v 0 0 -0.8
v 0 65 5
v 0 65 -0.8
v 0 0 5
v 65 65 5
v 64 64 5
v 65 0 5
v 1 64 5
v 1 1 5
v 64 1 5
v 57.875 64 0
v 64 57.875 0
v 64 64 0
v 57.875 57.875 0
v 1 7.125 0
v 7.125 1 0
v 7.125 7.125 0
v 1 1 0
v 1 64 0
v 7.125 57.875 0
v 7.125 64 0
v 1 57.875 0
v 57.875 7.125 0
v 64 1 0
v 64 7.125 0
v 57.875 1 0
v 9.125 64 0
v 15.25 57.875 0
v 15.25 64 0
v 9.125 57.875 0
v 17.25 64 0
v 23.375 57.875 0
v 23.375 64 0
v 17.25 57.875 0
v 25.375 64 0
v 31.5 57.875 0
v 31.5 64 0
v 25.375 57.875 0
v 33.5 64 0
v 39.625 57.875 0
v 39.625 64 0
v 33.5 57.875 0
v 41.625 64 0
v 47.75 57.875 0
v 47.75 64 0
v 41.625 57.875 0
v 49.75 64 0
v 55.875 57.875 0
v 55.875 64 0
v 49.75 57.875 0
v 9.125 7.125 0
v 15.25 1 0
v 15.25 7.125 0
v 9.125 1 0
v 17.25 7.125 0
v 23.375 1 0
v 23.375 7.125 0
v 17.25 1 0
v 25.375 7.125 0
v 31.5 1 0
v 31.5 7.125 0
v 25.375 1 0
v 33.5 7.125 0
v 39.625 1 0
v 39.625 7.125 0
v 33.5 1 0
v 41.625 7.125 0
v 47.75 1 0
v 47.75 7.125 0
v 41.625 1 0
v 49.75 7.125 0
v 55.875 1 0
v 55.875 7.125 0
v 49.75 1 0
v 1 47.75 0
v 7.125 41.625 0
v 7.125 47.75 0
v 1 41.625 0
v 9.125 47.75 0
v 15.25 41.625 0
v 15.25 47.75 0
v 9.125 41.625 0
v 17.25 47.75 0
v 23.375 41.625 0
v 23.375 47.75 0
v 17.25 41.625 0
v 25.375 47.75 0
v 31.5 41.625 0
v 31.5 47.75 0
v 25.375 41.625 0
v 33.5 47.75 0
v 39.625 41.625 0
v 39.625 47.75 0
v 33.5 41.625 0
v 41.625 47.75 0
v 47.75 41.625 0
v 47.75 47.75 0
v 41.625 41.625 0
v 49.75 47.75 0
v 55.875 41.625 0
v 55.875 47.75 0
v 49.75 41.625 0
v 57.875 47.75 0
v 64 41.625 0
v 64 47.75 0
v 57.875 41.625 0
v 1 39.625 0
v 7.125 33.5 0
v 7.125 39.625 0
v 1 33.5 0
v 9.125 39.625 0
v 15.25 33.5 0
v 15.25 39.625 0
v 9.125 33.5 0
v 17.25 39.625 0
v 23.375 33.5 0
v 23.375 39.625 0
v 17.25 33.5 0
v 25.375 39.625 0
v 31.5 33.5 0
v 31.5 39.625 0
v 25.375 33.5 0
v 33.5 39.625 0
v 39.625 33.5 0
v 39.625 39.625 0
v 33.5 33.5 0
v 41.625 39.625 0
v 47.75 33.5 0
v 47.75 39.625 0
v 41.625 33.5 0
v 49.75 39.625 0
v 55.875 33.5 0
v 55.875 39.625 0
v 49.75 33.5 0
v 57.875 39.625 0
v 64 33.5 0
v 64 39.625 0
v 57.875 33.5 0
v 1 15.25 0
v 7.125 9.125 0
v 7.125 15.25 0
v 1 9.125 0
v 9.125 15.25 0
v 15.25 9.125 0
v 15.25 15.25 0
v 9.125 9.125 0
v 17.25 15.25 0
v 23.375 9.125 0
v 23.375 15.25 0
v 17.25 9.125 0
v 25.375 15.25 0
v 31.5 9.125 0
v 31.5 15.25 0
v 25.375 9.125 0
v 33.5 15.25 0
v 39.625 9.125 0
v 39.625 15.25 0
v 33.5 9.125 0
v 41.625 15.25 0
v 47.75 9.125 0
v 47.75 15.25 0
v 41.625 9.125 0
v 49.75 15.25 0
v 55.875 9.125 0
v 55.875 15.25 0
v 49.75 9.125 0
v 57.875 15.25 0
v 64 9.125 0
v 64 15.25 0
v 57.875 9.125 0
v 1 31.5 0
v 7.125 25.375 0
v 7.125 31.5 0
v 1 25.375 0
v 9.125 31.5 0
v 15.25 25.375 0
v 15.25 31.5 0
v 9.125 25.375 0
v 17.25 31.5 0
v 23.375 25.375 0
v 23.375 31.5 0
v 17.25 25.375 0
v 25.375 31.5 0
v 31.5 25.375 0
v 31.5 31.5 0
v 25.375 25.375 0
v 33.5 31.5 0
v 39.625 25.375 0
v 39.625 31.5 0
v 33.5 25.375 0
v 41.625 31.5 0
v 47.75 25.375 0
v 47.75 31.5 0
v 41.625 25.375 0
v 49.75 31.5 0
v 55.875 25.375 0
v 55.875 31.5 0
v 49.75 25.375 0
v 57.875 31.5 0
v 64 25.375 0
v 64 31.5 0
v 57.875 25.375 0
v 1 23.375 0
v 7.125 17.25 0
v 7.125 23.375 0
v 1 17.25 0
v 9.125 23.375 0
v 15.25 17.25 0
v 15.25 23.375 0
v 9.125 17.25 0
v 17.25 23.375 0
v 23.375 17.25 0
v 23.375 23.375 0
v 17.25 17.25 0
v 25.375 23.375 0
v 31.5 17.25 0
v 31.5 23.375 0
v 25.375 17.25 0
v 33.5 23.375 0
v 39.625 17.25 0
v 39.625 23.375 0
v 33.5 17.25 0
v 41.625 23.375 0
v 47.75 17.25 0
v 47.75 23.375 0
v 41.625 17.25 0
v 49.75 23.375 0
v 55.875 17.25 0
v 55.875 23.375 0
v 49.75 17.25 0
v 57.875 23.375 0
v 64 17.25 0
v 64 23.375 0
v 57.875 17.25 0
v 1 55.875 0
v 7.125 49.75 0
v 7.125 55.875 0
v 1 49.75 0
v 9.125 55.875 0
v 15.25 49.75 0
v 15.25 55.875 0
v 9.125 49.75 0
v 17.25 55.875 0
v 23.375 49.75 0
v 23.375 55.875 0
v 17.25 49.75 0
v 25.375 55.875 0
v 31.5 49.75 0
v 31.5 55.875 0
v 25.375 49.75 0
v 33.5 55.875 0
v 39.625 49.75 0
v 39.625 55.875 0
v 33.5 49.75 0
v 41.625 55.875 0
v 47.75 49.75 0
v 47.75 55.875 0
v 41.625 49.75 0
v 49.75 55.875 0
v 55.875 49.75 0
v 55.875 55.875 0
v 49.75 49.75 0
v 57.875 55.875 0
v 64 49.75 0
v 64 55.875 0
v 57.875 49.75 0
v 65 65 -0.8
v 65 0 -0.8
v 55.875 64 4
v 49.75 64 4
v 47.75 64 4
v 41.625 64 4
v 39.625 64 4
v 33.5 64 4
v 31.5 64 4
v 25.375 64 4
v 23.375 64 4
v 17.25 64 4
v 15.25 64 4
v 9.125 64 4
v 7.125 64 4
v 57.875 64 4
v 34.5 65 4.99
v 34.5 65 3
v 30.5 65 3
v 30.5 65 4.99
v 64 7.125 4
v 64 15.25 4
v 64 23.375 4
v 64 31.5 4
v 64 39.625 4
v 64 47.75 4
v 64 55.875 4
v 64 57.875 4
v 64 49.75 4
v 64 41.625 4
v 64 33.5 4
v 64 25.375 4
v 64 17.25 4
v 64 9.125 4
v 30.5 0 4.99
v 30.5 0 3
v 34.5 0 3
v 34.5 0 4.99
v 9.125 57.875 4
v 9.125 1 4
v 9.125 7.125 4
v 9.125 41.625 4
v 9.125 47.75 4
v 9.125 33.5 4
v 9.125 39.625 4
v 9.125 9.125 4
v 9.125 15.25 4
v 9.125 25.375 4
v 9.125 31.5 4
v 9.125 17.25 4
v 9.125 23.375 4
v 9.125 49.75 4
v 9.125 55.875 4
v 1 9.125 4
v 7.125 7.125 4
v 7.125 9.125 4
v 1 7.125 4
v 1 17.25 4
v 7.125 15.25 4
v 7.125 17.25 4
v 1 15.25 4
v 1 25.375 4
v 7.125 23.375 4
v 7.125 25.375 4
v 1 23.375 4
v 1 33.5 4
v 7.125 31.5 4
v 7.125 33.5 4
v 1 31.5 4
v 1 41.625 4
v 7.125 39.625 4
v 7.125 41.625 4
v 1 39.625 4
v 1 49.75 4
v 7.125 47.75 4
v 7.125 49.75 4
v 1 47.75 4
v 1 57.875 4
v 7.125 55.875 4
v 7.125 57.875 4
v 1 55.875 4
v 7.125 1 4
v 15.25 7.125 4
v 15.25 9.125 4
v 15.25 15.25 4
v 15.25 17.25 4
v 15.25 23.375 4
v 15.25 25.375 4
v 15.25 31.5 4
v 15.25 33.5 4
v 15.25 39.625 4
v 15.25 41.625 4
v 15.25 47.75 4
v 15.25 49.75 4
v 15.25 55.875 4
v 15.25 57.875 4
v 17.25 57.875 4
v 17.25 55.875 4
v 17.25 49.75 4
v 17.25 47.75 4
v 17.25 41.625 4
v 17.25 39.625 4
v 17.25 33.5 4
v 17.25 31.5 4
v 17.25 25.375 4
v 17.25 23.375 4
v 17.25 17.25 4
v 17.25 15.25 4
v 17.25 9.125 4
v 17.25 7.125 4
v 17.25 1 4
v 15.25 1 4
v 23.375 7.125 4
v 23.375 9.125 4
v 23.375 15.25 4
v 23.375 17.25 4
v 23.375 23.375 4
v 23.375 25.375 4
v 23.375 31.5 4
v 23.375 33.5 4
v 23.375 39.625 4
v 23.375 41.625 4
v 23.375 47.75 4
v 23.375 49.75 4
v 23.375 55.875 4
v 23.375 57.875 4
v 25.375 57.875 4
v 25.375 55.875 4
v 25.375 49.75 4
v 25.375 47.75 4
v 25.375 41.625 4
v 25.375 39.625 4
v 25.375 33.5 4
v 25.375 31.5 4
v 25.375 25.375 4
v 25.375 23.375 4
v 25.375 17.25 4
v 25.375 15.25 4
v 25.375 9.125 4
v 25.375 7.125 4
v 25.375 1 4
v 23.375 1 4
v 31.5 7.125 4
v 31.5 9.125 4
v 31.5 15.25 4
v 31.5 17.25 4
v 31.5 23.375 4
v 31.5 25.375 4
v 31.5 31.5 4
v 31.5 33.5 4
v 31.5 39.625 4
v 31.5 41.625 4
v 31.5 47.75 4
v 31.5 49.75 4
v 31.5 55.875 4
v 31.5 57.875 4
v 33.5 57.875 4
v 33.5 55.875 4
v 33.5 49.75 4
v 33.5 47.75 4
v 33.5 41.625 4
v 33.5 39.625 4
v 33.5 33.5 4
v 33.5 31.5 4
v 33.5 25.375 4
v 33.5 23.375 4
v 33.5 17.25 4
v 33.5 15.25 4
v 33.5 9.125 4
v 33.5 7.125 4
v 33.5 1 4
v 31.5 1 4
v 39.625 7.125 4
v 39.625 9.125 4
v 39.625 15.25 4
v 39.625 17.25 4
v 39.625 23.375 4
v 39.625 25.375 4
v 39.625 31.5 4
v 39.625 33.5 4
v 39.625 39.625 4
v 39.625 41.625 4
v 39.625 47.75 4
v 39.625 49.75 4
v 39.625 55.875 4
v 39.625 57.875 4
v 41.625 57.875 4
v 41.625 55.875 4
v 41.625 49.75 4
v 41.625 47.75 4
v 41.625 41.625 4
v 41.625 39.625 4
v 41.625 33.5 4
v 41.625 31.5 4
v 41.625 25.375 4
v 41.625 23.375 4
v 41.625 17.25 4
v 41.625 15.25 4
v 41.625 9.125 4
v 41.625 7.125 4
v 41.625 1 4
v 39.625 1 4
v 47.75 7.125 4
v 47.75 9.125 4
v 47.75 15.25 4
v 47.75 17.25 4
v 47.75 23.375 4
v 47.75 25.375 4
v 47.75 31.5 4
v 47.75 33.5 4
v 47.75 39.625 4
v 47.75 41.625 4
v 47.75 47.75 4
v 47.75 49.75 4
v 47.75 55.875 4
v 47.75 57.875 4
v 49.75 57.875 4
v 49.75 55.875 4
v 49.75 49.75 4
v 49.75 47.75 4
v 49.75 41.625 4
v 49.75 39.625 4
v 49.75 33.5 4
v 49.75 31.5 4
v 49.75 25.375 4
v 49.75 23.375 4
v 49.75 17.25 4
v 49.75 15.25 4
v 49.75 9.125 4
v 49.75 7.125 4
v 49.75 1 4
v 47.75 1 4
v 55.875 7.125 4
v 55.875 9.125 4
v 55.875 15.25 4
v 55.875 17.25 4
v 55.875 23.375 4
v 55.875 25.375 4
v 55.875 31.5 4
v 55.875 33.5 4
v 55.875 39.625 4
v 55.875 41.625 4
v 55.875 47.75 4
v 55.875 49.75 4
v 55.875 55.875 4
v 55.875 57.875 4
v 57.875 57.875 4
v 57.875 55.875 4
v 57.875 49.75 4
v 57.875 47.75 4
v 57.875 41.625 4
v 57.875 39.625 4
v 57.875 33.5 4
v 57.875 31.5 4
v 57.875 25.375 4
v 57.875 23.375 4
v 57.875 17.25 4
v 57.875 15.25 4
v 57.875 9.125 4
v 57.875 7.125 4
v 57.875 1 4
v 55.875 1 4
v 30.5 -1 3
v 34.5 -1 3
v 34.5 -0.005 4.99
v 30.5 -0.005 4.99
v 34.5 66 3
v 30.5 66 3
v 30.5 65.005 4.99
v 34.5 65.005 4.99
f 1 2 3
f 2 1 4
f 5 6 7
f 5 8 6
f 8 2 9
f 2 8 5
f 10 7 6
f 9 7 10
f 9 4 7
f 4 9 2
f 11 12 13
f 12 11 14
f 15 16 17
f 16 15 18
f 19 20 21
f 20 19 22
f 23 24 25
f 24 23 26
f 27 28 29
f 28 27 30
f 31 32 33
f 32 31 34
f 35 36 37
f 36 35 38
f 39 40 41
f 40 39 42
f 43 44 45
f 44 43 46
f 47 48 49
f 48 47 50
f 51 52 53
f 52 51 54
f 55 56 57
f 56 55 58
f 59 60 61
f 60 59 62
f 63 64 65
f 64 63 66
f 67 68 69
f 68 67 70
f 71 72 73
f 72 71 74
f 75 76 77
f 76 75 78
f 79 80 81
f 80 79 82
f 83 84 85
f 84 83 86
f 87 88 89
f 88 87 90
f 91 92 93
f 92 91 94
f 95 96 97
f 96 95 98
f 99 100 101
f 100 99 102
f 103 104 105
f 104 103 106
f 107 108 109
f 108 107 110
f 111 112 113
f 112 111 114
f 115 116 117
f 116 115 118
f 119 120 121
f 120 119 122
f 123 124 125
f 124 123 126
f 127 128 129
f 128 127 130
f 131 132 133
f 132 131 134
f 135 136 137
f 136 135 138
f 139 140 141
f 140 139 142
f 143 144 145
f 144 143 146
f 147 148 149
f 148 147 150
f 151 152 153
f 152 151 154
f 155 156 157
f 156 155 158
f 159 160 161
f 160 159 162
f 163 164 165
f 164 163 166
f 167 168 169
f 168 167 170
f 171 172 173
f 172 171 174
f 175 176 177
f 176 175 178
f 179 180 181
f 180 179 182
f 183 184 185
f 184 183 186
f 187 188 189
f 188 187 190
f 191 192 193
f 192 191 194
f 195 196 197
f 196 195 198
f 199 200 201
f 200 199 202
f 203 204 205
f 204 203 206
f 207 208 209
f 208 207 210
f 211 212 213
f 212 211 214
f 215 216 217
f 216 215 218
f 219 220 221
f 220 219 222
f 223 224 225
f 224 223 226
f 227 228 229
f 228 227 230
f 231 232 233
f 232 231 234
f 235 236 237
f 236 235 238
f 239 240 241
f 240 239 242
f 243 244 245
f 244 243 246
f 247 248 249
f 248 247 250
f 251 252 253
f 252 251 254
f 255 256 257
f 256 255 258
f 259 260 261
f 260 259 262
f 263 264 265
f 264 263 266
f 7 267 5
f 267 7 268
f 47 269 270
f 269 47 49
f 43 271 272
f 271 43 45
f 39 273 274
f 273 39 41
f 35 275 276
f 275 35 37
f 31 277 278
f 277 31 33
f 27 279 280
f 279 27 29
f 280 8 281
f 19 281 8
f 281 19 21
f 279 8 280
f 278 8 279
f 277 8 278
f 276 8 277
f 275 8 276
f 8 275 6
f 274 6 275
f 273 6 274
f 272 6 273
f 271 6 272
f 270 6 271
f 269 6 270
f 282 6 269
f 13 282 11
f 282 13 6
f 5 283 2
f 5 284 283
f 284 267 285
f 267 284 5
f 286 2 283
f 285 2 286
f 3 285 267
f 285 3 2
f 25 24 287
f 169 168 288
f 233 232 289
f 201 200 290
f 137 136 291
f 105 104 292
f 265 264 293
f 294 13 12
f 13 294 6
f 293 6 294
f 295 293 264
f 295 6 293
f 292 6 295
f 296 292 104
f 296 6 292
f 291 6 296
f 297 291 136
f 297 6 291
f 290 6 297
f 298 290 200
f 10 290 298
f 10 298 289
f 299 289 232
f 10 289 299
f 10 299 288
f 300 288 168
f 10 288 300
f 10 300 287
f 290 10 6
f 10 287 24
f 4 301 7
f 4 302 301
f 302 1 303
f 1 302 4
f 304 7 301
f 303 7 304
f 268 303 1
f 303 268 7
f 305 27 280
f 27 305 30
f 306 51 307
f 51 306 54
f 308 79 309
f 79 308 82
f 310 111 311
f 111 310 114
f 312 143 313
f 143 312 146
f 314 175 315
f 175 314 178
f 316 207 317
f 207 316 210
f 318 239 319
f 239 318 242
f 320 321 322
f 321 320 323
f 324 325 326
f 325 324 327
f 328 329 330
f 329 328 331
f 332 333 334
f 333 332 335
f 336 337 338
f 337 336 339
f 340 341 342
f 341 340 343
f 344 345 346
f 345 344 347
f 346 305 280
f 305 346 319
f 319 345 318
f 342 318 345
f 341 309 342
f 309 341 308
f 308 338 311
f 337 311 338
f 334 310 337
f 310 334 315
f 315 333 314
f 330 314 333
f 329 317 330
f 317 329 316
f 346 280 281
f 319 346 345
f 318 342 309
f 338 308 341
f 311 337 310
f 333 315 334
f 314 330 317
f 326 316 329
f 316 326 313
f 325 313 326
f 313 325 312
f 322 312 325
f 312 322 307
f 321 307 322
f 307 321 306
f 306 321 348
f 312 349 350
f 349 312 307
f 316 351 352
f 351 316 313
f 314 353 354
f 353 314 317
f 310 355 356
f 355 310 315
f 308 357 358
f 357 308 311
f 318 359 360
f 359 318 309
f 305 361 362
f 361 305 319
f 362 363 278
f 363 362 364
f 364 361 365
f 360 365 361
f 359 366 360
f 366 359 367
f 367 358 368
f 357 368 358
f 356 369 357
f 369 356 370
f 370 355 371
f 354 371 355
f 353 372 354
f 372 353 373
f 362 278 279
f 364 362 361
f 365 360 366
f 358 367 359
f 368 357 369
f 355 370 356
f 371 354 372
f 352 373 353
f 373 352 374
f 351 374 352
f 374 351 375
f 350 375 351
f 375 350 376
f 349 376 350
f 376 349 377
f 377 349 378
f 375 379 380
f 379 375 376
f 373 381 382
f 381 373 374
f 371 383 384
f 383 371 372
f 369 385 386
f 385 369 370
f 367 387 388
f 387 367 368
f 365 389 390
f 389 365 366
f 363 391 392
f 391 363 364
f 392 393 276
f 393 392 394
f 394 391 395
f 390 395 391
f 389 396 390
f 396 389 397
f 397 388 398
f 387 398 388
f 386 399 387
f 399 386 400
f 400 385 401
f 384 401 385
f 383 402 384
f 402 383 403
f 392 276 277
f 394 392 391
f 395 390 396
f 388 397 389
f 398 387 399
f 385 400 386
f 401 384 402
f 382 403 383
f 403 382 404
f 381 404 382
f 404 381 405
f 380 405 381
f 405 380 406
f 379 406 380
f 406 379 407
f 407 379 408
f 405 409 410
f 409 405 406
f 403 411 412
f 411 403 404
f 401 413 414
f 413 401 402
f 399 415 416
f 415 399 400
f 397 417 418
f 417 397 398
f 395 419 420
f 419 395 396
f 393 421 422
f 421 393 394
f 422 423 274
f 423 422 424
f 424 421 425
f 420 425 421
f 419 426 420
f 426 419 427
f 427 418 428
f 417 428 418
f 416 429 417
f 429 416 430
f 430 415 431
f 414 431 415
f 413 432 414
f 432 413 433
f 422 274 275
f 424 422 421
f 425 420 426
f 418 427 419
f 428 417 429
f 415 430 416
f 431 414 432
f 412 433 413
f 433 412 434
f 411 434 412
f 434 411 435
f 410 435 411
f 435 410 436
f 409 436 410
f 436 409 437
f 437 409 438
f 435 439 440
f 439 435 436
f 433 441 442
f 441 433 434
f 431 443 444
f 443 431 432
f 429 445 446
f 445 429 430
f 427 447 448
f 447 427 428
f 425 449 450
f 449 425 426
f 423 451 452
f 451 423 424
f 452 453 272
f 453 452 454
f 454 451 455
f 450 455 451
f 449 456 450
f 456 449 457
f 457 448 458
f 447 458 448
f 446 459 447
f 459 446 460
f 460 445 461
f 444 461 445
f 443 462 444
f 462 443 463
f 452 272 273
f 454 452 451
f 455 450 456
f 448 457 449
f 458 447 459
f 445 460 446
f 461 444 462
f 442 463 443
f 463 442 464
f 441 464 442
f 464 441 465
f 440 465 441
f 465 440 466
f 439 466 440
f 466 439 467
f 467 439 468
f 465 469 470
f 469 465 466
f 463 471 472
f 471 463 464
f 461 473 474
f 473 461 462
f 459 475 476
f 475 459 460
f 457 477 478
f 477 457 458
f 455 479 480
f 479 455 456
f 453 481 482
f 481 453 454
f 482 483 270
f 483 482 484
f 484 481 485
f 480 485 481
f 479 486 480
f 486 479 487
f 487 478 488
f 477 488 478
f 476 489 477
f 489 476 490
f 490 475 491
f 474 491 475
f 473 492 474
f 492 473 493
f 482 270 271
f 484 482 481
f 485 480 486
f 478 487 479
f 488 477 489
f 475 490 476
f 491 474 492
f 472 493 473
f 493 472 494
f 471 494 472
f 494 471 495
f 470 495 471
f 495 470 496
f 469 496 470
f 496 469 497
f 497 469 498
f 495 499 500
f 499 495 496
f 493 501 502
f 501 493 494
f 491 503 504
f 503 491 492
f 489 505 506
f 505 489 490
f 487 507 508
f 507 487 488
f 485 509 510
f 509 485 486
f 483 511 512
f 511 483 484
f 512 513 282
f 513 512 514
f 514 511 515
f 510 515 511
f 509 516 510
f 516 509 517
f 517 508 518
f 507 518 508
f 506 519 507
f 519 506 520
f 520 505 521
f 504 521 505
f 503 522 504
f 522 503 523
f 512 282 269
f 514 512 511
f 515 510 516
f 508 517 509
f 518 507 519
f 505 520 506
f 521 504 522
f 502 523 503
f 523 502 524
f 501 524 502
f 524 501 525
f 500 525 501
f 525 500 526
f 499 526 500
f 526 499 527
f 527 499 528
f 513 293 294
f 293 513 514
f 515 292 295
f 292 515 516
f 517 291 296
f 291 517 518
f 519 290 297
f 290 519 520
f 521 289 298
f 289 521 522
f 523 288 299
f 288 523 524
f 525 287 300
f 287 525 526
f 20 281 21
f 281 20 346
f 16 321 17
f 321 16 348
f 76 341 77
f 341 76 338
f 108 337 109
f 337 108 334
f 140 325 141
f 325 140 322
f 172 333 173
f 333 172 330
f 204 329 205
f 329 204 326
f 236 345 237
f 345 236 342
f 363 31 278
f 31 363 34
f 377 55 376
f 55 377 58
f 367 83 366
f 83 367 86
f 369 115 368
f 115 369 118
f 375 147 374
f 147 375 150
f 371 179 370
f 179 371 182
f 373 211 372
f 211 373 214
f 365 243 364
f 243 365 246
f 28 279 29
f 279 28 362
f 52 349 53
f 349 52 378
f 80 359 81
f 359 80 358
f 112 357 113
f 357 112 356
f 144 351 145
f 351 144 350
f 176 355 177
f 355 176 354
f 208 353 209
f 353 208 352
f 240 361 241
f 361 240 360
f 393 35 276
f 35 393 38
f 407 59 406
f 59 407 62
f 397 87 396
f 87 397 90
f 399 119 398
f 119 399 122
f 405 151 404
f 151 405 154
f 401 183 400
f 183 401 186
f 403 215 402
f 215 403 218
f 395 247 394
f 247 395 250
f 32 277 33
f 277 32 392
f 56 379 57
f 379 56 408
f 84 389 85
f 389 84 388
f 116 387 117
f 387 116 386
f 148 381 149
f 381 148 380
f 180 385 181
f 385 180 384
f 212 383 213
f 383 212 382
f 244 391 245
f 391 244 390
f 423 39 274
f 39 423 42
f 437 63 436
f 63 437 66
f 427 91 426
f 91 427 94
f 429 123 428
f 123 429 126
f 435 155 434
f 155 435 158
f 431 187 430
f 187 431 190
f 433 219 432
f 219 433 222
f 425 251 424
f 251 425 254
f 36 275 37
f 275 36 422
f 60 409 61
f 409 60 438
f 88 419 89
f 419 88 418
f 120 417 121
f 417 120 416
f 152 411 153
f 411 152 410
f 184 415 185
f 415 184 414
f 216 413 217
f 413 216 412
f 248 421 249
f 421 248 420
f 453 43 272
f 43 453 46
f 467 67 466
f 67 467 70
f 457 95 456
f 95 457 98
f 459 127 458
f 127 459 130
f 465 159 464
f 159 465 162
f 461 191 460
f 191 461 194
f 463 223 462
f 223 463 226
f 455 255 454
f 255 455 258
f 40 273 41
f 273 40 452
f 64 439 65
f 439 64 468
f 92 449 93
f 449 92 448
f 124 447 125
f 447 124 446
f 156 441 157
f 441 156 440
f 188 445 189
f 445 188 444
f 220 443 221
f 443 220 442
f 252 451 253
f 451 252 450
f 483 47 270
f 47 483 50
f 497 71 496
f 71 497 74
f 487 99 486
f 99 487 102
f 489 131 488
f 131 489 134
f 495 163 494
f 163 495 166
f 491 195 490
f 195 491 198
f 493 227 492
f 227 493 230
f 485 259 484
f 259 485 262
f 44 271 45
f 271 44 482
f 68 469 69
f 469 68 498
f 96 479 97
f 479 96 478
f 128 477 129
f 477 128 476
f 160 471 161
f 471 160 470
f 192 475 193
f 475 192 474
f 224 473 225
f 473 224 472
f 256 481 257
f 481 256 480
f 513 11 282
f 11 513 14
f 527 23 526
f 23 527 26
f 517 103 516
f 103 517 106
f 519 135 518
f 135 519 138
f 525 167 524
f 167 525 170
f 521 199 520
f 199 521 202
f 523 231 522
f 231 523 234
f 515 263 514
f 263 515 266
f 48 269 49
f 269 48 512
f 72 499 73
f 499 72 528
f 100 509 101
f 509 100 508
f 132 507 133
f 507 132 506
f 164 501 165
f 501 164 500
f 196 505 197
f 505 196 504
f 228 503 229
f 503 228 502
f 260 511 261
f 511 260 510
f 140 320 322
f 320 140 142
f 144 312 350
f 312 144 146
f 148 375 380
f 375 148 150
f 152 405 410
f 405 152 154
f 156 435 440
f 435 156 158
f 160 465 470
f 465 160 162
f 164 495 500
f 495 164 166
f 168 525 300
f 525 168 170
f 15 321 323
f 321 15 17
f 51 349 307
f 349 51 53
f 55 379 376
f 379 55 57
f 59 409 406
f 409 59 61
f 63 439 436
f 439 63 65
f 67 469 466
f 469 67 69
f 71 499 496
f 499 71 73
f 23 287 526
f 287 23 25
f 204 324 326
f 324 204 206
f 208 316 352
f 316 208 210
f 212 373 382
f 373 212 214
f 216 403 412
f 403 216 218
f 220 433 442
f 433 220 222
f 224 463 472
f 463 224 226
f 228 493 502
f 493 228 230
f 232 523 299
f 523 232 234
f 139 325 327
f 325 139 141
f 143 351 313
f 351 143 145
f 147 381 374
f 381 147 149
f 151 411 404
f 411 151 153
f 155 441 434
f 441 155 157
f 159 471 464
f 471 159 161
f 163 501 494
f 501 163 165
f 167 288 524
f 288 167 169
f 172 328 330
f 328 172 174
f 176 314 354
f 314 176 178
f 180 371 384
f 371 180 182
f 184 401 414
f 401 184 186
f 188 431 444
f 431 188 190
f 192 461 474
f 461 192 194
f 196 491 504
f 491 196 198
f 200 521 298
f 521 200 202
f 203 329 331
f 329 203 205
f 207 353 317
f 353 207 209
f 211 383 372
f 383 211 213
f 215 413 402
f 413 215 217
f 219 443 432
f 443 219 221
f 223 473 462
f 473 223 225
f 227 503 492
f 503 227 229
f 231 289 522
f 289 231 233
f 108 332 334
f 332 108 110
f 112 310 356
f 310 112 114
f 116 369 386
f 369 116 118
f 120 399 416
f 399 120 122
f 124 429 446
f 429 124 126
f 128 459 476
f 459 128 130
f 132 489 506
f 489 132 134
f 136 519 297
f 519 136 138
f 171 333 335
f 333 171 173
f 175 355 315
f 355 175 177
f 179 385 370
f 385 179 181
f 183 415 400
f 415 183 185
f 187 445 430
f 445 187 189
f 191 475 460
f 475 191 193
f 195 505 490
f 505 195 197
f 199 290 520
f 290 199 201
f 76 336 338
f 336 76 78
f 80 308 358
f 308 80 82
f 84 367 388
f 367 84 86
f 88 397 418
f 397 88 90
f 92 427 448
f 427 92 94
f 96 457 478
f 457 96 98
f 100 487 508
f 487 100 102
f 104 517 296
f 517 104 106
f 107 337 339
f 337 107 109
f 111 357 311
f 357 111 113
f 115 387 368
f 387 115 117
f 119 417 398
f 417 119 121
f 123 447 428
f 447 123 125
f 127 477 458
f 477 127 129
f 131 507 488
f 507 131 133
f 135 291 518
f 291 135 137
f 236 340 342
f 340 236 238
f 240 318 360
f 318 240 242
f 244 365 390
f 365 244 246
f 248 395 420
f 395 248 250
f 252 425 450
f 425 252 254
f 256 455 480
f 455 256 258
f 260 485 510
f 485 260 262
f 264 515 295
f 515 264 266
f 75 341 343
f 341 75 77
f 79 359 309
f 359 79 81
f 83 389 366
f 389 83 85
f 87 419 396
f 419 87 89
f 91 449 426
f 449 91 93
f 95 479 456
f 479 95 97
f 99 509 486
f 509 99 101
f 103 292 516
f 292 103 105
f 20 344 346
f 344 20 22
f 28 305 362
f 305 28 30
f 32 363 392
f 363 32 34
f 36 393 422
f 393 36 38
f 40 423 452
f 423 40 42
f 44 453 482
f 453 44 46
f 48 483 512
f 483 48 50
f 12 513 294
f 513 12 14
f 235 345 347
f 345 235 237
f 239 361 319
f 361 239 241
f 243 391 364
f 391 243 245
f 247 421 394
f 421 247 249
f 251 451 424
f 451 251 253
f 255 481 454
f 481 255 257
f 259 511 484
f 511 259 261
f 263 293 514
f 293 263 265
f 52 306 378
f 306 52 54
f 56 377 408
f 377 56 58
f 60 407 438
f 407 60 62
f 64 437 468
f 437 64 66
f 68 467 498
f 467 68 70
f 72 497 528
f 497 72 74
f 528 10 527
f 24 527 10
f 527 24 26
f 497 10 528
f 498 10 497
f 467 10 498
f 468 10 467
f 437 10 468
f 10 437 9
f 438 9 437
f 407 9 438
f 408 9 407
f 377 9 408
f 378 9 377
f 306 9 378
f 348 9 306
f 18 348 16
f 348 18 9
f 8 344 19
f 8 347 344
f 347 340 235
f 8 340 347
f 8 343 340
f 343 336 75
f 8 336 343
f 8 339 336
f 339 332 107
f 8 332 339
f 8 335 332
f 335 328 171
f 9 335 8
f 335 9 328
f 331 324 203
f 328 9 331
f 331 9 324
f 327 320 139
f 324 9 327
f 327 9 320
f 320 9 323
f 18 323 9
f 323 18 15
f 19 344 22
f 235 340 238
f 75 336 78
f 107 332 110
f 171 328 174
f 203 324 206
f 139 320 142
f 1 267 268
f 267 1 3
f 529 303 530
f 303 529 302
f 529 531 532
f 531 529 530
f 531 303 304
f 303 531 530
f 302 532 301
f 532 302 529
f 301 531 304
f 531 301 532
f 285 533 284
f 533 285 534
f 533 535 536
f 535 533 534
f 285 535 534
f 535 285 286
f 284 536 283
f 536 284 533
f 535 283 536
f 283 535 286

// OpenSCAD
$fn = 100;

// printed part
// diffusor / mounted on led panel
$height_mm = 5;
$outer_wall_space_mm = 1;
$diffusor_width_mm = 0.8;
$wall_width_mm = 2;
$nudge_center_from_outside_mm = 4;
$nudge_depth_mm = 3.5;
$nudge_width_mm = 6;
$nudge_height_mm = 3;
// cube / frame / diffusor mount
$mount_surface_mm = 3;
$mount_offset_mm = 2;
$tolerance_mm = 0.5;
$panel_space_mm = 5;
$edge_cut_mm = 3;
$corner_cut_mm = 6.5;
$inner_nudge_depth_mm = 1;
$inner_nudge_width_mm = 4;
$inner_nudge_height_mm = 2;

//// 8x8
$num_leds_x = 8;
$num_leds_y = 8;
$led_dist_x = 65/8;
$led_dist_y = 65/8;
// 16x16
//$num_leds_x = 16;
//$num_leds_y = 16;
//$led_dist_x = 10;
//$led_dist_y = 10;

// main
$wall_height_mm = $height_mm - $outer_wall_space_mm;
$outer_x = ($num_leds_x) * $led_dist_x;
$outer_y = ($num_leds_y) * $led_dist_y;

$small= $outer_x + ($tolerance_mm) * 2;
$big = $small + ($height_mm + $panel_space_mm) * 2;

cap();
nudges();

module prism(l, w, h){
    translate([-l/2,-w/2,-h/2])
    polyhedron(
        points=[
            [0,0,0], [l,0,0], [l,w,0], [0,w,0], [0,w,h], [l,w,h]],
        faces=[[0,1,2,3],[5,4,3,2],[0,4,5,1],[0,3,4],[5,2,1]]
    );
}

module nudge(r) {
    translate([$outer_x/2,$outer_y/2,$nudge_center_from_outside_mm])
    rotate([0,0,r])
    translate([0,-$outer_x/2-$inner_nudge_depth_mm/2,0]) {
        difference() {
        prism($inner_nudge_width_mm,$inner_nudge_depth_mm,$inner_nudge_height_mm);
        translate([0,0,$height_mm - $nudge_center_from_outside_mm + 3 - 0.01])
        cube([6,6,6],center=true);
        }
    }
}
module nudges() {
    nudge(0);
    nudge(180);
}

module cap() {
    union() {
        // <outer walls>
        cube([$outer_x, $wall_width_mm/2, $height_mm]);
        cube([$wall_width_mm/2, $outer_y, $height_mm]);
        translate([$outer_x, $outer_y]){
            rotate([0,0,180]) {
                cube([$outer_x, $wall_width_mm/2, $height_mm]);
                cube([$wall_width_mm/2, $outer_y, $height_mm]);
            }
        }
        // </outer walls>

        // <inner walls>
        for($x = [1 : $num_leds_x-1]) {
            $offset_x = $x * $led_dist_x;
            
            translate([$offset_x - ($wall_width_mm/2), 0, 0]) {
                cube([$wall_width_mm, $outer_y, $wall_height_mm]);
            }
        }
        for($y = [1 : $num_leds_y - 1]) {
            $offset_y = $y * $led_dist_y;
            
            translate([0, $offset_y - ($wall_width_mm/2), 0]) {
                cube([$outer_x, $wall_width_mm, $wall_height_mm]);
            }
        }
        // </inner walls>

        // <diffusor>
        translate([0,0,-$diffusor_width_mm]) {
            cube([$outer_x, $outer_y, $diffusor_width_mm]);
        }
        // </diffusor>
    }
}
